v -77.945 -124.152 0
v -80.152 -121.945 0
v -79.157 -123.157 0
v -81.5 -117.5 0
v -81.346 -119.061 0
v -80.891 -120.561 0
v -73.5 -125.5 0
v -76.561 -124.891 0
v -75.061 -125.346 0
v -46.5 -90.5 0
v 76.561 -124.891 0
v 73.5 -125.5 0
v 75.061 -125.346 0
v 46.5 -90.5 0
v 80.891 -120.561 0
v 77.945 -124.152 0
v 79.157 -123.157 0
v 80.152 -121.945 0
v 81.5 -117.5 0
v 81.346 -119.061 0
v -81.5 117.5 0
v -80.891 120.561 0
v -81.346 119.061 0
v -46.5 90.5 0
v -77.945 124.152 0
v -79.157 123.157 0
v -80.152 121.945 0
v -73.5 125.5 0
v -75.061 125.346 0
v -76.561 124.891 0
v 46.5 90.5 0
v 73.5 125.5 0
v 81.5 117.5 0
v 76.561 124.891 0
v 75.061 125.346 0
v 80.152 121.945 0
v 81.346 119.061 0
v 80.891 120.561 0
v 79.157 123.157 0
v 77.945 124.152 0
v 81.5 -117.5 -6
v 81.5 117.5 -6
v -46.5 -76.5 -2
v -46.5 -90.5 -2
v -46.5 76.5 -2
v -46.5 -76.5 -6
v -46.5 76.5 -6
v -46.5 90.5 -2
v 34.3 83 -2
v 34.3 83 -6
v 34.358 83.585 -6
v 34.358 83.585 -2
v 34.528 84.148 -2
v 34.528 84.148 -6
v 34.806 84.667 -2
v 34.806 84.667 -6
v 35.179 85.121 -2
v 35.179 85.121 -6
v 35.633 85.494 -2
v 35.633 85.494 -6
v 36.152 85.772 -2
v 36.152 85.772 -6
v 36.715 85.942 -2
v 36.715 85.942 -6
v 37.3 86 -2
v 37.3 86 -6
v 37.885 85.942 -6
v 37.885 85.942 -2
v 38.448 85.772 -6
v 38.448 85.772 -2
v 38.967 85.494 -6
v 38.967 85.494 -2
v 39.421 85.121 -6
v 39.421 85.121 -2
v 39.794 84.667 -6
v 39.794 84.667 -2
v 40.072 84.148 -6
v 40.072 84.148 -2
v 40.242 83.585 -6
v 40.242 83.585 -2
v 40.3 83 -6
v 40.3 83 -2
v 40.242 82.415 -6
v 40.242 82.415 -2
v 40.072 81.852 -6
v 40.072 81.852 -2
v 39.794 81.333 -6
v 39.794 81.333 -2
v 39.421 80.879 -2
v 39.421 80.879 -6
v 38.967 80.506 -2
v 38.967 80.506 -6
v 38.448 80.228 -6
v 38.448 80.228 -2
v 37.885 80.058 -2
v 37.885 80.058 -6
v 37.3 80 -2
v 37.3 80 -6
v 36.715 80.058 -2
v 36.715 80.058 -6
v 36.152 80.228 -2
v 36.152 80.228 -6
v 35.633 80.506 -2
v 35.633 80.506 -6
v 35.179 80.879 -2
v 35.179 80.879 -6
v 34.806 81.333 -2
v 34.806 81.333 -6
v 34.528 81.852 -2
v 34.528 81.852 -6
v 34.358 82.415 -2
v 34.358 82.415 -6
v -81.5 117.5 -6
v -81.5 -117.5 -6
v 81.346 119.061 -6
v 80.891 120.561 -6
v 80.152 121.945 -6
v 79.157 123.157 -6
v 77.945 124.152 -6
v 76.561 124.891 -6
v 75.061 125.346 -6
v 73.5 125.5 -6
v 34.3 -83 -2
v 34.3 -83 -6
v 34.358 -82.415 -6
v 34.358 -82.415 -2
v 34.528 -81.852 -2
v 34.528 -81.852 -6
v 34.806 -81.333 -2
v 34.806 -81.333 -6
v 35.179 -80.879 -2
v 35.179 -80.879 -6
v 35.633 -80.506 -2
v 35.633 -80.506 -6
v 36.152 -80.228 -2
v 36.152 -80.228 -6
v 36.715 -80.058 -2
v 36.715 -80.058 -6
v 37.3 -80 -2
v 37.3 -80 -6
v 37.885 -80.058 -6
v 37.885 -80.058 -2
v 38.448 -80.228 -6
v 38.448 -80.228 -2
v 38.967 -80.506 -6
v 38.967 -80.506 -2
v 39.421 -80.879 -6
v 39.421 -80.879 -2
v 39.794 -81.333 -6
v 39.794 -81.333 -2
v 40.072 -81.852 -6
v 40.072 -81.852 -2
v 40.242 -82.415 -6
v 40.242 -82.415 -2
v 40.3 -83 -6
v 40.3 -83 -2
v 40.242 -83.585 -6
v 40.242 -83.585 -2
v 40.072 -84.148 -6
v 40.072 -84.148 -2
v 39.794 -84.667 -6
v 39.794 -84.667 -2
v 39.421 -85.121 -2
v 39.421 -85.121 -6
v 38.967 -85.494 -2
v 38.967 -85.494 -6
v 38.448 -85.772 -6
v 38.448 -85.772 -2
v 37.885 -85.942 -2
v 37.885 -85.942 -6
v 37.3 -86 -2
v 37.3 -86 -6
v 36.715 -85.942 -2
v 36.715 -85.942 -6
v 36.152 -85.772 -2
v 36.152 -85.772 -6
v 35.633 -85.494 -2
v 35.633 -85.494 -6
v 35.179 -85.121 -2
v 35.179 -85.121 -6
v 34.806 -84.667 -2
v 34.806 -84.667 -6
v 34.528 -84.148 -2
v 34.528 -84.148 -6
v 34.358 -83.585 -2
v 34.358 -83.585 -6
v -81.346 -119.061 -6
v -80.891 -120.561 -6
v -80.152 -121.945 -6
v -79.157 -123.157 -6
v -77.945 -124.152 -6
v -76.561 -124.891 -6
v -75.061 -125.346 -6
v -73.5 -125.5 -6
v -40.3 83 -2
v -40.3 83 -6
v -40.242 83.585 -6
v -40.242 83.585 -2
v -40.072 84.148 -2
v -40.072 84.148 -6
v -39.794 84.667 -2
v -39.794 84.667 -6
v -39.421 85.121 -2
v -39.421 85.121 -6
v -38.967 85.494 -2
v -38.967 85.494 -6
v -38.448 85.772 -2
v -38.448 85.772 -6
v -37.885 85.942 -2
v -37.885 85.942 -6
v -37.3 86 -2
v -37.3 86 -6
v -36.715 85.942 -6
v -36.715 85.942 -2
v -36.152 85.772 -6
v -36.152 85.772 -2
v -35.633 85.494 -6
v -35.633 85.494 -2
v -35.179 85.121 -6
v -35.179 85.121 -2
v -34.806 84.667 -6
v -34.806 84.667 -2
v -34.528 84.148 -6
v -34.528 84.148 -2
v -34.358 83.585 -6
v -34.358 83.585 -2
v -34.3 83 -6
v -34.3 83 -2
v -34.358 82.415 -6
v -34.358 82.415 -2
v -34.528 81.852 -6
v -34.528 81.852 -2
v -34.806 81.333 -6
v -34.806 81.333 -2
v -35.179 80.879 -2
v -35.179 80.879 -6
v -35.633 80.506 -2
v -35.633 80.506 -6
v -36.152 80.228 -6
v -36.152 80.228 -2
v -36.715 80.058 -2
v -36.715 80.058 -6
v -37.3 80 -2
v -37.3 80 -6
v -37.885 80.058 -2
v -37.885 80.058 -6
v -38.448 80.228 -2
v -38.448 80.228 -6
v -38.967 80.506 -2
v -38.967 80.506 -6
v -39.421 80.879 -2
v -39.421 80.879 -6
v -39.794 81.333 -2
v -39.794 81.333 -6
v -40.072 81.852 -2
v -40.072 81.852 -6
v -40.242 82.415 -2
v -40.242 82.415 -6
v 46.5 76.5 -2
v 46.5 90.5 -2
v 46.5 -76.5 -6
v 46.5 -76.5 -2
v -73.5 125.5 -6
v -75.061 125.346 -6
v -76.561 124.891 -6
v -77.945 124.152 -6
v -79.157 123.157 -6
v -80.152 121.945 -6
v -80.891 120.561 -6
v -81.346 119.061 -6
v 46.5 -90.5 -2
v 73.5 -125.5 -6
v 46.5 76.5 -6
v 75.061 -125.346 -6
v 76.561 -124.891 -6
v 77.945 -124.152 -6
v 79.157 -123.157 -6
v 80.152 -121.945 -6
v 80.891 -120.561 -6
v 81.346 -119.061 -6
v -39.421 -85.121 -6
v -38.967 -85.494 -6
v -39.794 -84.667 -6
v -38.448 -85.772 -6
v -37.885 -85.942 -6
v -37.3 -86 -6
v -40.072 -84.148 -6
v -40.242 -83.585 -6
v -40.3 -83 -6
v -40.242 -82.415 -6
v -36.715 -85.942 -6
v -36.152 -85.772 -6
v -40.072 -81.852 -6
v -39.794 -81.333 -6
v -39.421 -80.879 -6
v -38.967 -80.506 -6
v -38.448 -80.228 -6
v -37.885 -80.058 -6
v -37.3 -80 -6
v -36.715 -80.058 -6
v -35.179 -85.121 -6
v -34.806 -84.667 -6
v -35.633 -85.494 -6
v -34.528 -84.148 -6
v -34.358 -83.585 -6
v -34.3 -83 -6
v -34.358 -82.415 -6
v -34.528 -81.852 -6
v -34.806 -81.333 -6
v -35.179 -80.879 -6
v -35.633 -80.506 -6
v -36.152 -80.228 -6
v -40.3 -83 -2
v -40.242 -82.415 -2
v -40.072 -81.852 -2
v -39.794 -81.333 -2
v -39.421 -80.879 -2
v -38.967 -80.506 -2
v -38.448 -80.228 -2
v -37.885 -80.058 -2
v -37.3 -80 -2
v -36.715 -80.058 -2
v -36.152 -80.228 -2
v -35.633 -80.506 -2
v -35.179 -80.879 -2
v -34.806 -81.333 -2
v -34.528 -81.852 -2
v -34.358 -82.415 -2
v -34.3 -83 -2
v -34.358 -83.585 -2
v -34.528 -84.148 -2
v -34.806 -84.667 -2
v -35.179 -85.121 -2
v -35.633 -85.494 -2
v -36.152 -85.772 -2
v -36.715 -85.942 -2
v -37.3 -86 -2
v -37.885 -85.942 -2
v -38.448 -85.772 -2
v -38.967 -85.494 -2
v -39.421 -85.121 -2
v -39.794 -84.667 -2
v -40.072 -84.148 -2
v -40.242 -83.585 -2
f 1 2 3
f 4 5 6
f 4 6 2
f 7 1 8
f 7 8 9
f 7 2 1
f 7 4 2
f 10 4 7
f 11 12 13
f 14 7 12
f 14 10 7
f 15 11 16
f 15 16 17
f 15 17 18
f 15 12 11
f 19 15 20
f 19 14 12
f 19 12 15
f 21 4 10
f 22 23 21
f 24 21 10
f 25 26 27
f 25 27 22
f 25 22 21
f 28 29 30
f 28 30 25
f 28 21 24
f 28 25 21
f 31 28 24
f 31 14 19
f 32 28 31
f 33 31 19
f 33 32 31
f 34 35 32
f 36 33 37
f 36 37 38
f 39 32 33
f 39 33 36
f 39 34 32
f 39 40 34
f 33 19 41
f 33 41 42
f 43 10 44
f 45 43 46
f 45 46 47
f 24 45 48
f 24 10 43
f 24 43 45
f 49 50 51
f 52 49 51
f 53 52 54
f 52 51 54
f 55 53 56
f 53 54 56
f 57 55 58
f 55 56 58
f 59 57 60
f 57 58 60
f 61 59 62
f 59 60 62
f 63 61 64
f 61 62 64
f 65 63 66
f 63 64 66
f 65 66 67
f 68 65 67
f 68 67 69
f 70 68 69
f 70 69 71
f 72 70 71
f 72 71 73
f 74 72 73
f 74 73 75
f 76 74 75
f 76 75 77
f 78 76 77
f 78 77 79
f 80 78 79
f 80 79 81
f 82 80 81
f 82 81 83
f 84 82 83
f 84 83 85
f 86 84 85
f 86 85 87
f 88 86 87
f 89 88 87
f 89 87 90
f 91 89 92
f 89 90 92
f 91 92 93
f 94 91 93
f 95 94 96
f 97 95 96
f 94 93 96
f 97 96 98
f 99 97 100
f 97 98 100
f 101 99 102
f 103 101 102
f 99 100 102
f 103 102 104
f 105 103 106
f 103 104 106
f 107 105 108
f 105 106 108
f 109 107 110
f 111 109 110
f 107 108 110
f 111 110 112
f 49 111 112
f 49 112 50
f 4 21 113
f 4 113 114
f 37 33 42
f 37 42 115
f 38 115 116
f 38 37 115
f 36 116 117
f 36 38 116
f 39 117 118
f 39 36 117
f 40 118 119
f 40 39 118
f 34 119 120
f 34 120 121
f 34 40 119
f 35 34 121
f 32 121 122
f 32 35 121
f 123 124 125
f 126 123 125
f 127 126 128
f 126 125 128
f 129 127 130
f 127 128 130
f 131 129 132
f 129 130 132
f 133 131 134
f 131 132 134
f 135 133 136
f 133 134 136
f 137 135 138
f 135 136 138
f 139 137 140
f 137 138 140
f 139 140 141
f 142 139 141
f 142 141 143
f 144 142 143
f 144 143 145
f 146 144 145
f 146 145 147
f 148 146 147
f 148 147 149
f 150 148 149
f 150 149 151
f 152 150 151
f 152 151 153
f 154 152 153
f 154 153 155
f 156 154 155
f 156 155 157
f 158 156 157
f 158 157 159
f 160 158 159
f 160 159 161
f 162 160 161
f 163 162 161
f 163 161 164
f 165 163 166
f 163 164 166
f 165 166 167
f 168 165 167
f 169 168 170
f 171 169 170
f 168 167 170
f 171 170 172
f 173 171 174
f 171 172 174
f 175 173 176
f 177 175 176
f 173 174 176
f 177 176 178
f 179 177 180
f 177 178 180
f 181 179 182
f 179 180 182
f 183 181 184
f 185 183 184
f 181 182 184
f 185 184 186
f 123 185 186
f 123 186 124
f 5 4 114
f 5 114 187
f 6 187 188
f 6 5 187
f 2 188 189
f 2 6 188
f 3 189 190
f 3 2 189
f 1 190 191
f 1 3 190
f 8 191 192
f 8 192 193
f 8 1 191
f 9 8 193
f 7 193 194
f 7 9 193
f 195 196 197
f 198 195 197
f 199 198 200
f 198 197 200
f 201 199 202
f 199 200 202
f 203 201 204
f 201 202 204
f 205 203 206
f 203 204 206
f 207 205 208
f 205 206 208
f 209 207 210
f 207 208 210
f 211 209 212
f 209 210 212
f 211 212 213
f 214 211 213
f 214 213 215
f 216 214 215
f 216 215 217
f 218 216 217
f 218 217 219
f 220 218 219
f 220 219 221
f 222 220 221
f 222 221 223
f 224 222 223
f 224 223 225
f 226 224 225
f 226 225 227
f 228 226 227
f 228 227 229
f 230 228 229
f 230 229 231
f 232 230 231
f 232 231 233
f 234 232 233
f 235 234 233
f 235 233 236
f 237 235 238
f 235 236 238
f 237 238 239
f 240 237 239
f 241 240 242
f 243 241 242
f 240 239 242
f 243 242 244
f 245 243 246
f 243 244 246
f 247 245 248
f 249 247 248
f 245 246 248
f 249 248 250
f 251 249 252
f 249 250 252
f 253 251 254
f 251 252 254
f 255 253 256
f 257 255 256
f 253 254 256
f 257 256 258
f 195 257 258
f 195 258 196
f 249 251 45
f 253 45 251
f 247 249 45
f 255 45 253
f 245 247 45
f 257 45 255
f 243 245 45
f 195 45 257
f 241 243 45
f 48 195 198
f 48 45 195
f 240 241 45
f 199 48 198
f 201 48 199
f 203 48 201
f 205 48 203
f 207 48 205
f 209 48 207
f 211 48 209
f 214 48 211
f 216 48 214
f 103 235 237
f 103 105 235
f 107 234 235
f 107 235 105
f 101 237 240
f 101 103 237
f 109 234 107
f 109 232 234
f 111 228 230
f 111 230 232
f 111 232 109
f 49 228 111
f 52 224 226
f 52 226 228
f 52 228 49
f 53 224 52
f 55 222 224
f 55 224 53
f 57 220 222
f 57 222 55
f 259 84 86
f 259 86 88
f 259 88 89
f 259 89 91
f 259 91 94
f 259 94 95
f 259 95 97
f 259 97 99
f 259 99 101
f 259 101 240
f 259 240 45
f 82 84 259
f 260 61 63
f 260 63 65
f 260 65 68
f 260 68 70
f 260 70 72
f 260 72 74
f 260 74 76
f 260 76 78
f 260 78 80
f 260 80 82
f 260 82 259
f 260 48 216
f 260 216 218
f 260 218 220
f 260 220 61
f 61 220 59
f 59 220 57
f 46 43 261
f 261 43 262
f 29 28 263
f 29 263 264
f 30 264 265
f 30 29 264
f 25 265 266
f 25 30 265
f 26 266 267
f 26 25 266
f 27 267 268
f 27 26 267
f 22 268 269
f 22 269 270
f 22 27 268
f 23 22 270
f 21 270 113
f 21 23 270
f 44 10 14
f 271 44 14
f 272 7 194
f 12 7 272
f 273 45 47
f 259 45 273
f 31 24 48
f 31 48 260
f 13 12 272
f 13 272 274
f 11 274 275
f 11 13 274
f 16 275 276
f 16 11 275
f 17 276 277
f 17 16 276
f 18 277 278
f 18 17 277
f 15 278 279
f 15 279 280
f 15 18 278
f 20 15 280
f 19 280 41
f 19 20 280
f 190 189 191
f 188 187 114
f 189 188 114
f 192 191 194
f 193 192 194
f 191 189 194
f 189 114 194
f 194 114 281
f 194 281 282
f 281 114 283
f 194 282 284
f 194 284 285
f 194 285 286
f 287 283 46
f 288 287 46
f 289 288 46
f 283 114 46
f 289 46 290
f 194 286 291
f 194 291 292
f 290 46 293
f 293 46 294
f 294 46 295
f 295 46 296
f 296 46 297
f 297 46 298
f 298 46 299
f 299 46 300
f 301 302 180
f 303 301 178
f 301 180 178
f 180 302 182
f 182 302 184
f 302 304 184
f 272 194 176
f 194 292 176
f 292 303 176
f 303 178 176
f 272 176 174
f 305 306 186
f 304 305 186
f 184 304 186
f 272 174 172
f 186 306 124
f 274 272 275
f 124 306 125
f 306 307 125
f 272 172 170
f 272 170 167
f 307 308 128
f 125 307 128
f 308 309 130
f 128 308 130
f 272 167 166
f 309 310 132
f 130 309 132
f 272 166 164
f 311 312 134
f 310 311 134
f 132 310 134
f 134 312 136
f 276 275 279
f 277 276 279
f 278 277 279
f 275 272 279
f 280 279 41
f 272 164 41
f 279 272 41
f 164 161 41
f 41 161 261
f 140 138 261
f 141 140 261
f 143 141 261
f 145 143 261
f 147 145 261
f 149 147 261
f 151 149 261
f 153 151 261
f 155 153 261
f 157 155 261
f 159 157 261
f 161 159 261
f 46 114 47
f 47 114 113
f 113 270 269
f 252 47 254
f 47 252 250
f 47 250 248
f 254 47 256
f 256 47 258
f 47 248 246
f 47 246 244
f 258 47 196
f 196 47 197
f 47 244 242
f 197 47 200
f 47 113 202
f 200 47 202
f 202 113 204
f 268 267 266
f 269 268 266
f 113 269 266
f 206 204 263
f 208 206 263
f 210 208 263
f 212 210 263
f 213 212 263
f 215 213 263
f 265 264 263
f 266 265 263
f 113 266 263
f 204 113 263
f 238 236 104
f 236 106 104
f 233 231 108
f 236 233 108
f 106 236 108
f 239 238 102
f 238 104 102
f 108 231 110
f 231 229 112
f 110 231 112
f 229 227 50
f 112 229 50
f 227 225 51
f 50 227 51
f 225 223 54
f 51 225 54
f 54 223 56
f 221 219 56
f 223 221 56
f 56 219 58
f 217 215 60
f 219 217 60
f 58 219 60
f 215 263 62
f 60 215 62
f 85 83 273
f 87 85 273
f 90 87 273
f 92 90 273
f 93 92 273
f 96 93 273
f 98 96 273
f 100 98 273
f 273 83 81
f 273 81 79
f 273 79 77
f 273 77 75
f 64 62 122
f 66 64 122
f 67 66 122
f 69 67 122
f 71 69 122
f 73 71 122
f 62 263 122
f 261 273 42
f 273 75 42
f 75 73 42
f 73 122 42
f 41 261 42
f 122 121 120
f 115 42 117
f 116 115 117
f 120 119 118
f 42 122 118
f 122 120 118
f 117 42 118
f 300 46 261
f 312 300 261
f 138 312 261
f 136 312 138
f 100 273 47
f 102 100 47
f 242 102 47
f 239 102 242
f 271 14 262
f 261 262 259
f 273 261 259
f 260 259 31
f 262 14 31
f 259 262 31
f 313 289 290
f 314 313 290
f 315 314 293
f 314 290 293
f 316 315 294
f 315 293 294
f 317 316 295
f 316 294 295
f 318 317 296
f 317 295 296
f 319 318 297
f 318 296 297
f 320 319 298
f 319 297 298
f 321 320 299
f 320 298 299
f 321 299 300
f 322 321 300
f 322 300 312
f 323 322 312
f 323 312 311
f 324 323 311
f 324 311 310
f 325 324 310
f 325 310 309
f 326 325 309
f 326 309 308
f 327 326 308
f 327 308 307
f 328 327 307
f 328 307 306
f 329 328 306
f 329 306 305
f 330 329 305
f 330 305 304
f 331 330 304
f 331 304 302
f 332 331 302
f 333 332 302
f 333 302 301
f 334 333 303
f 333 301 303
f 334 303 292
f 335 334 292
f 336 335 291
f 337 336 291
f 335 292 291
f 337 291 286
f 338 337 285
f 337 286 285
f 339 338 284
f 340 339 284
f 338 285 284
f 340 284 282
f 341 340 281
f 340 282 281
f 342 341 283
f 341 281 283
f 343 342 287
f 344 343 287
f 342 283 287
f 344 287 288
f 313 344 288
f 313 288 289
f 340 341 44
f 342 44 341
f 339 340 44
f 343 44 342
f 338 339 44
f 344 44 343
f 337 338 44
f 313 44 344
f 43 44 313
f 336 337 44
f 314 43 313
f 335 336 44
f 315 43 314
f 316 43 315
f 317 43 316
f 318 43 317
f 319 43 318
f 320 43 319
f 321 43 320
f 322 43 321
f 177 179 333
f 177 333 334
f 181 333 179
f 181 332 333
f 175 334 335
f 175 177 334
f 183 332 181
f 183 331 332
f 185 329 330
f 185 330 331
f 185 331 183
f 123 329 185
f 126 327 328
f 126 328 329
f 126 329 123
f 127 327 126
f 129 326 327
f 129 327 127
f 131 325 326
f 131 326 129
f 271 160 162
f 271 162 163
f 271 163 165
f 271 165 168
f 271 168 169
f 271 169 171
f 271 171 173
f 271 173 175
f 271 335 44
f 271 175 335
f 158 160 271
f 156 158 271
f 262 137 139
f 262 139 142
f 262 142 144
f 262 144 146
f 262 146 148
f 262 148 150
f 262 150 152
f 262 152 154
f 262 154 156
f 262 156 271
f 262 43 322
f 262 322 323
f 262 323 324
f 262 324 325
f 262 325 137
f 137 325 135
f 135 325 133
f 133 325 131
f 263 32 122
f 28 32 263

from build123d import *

# Parameters (mm, degrees)
F0_W     = 93
F0_H     = 153
F2_DEPTH = 6
F1_W     = 93
F1_H     = 14
F3_DEPTH = 2
F5_D     = 6


with BuildPart() as f2:
    # F0 (on Top) → F2 (new body)
    with BuildSketch(Plane.XY):
        with BuildLine():
            Line((-73.5, -125.5), (73.5, -125.5))
            ThreePointArc((73.5, -125.5), (79.1568542495, -123.1568542495), (81.5, -117.5))
            Line((81.5, -117.5), (81.5, 117.5))
            ThreePointArc((81.5, 117.5), (79.1568542495, 123.1568542495), (73.5, 125.5))
            Line((73.5, 125.5), (-73.5, 125.5))
            ThreePointArc((-73.5, 125.5), (-79.1568542495, 123.1568542495), (-81.5, 117.5))
            Line((-81.5, 117.5), (-81.5, -117.5))
            ThreePointArc((-81.5, -117.5), (-79.1568542495, -123.1568542495), (-73.5, -125.5))
        make_face()
        Rectangle(F0_W, F0_H, mode=Mode.SUBTRACT)
    extrude(amount=-F2_DEPTH)

    # F1 (on face) → F3 (cut)
    with BuildSketch(Plane.XY):
        with Locations((0, 83.5)):
            Rectangle(F1_W, F1_H)
        with Locations((0, -83.5)):
            Rectangle(F1_W, F1_H)
    extrude(amount=-F3_DEPTH, mode=Mode.SUBTRACT)

    # F5 (through all)
    with Locations(Plane.XY):
        with Locations((-37.3, 83), (37.3, 83), (37.3, -83), (-37.3, -83)):
            Hole(F5_D / 2)


solid = f2.part
